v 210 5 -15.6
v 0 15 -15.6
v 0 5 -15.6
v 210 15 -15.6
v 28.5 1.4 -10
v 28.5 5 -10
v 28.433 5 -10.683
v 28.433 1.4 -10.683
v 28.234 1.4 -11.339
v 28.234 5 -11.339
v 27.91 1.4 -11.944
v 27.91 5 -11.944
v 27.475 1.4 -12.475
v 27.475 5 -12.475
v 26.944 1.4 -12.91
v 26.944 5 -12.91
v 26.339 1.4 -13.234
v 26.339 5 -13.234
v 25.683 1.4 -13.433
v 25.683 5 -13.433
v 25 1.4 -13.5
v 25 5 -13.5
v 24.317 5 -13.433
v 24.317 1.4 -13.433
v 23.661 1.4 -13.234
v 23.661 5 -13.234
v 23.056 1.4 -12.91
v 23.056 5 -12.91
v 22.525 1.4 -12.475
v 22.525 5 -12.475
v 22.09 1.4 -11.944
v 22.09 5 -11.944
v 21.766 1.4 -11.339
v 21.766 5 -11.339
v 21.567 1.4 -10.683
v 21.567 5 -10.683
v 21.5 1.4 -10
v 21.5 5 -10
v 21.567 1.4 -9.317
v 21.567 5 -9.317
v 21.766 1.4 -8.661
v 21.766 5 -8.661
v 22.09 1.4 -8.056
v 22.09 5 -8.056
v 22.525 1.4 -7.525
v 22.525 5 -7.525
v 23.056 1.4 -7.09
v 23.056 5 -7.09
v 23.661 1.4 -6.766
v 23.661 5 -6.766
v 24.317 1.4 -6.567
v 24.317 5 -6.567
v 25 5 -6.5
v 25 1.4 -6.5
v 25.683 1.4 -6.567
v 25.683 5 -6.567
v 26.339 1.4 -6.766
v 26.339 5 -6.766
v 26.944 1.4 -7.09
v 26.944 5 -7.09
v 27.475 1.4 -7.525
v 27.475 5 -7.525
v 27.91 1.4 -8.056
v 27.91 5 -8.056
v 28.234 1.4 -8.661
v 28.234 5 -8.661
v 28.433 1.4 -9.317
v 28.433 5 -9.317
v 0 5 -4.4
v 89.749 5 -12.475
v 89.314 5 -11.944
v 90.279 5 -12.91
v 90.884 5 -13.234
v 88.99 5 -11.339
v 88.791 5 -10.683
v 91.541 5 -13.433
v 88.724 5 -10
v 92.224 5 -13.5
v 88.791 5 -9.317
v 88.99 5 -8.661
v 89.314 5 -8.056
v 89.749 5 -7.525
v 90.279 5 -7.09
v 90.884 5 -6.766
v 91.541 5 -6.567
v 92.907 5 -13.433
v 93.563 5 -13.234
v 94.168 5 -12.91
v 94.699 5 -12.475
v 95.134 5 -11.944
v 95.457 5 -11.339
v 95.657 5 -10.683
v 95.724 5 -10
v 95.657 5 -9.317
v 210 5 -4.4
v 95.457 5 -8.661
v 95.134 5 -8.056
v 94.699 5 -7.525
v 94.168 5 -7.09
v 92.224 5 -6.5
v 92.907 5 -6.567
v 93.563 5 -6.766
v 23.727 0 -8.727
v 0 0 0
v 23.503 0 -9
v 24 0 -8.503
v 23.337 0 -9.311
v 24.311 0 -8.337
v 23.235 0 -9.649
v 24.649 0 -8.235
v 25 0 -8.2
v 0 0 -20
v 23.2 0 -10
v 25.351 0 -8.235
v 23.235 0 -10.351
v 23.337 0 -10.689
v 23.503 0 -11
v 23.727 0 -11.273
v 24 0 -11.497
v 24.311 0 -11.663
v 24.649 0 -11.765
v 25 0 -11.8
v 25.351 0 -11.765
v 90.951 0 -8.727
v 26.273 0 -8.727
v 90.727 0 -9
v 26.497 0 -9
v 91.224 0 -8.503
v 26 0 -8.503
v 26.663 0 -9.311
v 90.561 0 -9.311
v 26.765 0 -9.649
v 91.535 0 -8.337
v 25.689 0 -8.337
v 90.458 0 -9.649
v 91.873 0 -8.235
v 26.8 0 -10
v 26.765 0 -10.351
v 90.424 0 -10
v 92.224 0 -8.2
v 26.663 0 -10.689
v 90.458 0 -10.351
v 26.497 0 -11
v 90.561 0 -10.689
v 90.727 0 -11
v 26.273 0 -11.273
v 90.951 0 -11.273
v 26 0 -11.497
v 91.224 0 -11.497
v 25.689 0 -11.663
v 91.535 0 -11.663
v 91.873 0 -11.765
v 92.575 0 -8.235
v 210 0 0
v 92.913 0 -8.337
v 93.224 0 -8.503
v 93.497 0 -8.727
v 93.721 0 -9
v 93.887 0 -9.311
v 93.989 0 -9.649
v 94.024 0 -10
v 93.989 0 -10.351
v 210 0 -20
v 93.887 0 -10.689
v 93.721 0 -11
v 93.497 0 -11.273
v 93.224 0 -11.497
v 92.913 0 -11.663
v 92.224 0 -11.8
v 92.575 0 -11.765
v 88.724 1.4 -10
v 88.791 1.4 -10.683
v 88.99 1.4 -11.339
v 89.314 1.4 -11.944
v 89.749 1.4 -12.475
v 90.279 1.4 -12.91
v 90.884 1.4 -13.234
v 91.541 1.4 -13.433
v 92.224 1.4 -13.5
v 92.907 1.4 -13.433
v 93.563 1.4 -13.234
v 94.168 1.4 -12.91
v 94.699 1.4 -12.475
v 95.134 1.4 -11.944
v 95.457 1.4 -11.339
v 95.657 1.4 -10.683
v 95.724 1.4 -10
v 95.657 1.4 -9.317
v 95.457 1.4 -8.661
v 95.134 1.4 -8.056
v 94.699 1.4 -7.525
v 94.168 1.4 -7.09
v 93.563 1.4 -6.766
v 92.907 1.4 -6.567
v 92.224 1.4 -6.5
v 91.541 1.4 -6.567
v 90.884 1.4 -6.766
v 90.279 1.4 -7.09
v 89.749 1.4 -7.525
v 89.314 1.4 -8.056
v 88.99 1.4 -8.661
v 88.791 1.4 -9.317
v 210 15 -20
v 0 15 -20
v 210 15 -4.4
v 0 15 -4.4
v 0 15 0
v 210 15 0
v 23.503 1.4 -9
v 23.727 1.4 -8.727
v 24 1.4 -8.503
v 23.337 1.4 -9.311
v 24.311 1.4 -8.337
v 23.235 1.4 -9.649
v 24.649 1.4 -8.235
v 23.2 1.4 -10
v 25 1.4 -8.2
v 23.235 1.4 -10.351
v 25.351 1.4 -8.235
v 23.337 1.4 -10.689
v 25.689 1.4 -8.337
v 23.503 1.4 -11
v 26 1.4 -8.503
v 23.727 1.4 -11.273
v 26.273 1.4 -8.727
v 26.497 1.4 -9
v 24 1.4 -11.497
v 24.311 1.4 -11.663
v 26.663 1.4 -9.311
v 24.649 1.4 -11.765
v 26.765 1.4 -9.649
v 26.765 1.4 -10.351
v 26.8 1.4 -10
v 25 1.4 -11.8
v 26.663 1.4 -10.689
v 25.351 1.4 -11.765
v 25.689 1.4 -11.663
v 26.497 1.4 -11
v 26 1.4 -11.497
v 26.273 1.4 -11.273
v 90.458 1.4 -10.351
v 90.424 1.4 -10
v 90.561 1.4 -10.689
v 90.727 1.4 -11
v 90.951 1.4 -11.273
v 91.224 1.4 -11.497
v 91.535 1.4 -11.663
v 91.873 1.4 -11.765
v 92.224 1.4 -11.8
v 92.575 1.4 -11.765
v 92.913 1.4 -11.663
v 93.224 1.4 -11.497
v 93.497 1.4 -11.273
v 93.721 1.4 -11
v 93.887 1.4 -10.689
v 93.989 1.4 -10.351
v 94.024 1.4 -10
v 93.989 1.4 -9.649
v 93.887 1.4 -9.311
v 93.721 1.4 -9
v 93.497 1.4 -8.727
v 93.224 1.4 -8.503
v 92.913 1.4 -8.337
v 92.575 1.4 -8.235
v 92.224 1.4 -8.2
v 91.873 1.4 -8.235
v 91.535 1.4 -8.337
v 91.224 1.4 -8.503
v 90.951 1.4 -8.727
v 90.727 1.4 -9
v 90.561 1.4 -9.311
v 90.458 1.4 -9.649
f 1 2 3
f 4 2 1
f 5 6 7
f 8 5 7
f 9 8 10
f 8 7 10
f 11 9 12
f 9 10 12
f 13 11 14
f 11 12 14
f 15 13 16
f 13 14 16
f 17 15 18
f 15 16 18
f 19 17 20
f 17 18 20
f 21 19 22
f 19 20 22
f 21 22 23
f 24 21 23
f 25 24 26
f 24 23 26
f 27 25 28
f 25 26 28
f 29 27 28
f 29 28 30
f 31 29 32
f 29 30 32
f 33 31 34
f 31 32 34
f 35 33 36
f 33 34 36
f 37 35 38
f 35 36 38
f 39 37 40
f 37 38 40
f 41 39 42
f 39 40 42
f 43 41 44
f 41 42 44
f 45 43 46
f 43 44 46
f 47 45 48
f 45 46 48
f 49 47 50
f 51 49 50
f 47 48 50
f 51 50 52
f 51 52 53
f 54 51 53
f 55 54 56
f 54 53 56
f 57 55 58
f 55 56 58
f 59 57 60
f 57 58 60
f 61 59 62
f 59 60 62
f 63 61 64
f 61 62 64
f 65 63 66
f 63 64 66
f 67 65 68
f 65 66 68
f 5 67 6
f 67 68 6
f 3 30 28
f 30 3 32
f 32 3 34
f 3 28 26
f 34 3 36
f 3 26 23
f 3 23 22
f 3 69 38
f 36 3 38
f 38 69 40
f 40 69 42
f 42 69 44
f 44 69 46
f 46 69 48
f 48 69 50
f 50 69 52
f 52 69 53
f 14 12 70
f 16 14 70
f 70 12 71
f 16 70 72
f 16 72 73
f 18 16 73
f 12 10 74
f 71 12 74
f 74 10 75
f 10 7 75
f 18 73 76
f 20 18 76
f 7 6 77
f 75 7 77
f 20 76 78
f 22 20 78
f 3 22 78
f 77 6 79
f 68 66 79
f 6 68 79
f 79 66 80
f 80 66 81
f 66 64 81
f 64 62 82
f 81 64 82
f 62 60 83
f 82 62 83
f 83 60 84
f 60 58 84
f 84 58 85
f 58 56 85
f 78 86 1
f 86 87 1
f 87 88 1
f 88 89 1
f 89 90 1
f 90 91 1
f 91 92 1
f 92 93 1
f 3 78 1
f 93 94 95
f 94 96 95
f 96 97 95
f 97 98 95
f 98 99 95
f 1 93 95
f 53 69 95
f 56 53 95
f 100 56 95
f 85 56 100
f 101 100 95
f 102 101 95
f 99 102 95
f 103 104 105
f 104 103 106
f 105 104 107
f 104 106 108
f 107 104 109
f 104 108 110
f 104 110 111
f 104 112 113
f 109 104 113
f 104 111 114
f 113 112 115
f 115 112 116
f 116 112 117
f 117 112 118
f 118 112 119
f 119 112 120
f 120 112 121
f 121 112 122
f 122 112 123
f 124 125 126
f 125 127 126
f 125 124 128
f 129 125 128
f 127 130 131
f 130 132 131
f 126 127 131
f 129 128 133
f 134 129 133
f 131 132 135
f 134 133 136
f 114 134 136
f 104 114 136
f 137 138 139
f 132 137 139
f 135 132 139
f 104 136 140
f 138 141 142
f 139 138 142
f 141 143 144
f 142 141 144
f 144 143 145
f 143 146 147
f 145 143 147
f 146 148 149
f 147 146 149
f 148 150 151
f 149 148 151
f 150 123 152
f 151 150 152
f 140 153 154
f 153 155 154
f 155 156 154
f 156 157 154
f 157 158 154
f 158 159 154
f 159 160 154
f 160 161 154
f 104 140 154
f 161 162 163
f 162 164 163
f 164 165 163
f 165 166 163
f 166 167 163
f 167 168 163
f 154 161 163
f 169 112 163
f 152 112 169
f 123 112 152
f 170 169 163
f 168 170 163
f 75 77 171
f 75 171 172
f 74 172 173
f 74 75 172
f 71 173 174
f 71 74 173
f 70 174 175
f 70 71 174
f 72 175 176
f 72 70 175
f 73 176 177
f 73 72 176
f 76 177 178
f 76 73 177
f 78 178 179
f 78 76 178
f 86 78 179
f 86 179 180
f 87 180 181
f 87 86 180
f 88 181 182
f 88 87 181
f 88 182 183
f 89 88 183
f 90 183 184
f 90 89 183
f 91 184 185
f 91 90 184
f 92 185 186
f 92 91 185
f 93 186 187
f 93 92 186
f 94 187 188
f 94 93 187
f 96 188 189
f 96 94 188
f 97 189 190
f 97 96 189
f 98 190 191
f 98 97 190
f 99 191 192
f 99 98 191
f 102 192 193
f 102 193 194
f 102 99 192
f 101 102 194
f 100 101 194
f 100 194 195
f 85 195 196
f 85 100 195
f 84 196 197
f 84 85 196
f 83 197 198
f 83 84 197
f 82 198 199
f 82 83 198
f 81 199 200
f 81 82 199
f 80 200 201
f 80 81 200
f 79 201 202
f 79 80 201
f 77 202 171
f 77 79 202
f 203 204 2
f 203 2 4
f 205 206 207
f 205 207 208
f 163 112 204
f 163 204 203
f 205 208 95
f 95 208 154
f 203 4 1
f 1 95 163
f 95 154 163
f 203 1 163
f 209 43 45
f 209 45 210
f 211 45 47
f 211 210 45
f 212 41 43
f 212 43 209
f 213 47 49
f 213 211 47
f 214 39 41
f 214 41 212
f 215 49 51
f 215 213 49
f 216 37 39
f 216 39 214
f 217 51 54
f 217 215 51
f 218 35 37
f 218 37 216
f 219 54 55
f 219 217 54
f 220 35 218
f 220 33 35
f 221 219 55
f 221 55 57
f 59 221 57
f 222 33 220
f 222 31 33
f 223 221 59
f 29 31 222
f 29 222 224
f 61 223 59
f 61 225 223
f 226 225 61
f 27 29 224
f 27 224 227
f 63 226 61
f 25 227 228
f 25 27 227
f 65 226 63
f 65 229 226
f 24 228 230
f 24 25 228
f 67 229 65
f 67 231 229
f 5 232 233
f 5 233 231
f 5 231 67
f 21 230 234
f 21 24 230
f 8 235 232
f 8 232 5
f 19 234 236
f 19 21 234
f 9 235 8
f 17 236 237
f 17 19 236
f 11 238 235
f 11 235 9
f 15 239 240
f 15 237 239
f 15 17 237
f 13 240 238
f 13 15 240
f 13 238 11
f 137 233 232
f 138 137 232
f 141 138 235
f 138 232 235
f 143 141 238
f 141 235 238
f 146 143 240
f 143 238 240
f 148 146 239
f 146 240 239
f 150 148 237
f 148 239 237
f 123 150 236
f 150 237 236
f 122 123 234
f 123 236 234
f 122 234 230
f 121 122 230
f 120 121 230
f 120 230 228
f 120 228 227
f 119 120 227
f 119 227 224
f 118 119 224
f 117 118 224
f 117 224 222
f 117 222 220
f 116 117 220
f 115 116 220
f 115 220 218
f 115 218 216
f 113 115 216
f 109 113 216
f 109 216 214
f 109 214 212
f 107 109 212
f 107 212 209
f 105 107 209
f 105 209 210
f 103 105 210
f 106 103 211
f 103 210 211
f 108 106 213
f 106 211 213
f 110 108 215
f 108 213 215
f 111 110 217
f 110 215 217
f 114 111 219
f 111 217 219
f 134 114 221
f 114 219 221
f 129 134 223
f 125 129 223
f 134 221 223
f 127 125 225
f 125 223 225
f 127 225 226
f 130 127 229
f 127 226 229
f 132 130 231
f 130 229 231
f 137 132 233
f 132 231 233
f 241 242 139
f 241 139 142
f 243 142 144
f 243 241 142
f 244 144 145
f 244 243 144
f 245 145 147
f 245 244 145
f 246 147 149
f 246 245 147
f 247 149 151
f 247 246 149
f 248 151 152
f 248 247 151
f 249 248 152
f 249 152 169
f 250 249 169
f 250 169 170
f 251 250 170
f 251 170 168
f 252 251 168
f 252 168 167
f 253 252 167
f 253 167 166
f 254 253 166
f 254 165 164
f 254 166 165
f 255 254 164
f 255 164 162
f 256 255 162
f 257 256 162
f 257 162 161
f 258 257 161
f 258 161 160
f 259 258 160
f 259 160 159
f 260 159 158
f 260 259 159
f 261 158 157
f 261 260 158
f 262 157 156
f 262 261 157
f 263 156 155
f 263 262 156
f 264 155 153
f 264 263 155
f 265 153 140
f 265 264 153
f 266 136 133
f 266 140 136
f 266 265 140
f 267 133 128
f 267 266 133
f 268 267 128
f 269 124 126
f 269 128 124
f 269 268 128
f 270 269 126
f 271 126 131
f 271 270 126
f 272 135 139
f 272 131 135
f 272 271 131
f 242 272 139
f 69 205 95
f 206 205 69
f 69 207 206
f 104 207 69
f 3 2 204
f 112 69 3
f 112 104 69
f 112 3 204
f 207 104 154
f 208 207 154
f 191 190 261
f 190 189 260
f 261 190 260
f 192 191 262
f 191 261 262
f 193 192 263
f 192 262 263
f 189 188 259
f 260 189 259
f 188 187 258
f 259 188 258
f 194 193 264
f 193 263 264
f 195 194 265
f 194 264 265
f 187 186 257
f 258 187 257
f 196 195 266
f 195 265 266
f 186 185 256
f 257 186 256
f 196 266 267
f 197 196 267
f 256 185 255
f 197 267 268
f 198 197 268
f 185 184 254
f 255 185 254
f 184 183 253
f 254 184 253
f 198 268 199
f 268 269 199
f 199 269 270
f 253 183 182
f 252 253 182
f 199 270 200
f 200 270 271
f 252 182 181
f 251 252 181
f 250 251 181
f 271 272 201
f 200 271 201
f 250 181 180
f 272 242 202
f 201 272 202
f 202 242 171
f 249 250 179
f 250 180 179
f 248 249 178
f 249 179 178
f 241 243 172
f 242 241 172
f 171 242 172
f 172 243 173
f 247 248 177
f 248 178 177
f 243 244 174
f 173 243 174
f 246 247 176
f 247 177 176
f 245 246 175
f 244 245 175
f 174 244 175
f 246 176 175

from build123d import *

# Parameters (mm, degrees)
SKETCH1_W           = 210
SKETCH1_H           = 20
BOSS_EXTRUDE1_DEPTH = 15
SKETCH2_W           = 210
SKETCH2_H           = 10
CUT_EXTRUDE1_DEPTH  = 10
SKETCH3_R           = 1.8
CUT_EXTRUDE2_DEPTH  = 6
SKETCH5_R           = 3.5
CUT_EXTRUDE3_DEPTH  = 3.6
SKETCH6_W           = 210
SKETCH6_H           = 10
CUT_EXTRUDE4_DEPTH  = 0.6
SKETCH7_W           = 210
SKETCH7_H           = 10
CUT_EXTRUDE5_DEPTH  = 0.6


with BuildPart() as part:
    # Sketch1 → Boss-Extrude1 (new body)
    with BuildSketch(Plane(origin=(0, 0, 0), x_dir=(1, 0, 0), z_dir=(0, 1, 0))):
        with Locations((105, 10)):
            Rectangle(SKETCH1_W, SKETCH1_H)
    extrude(amount=BOSS_EXTRUDE1_DEPTH)

    # Sketch2 → Cut-Extrude1 (cut)
    with BuildSketch(Plane(origin=(0, 15, 0), x_dir=(1, 0, 0), z_dir=(0, 1, 0))):
        with Locations((105, 10)):
            Rectangle(SKETCH2_W, SKETCH2_H)
    extrude(amount=-CUT_EXTRUDE1_DEPTH, mode=Mode.SUBTRACT)

    # Sketch3 → Cut-Extrude2 (cut, through all)
    with BuildSketch(Plane(origin=(0, 5, 0), x_dir=(1, 0, 0), z_dir=(0, 1, 0))):
        with Locations((25, 10)):
            Circle(SKETCH3_R)
    cut_extrude2 = extrude(amount=-CUT_EXTRUDE2_DEPTH, mode=Mode.SUBTRACT)

    # Sketch5 → Cut-Extrude3 (cut)
    with BuildSketch(Plane(origin=(0, 5, 0), x_dir=(1, 0, 0), z_dir=(0, 1, 0))):
        with Locations((25, 10)):
            Circle(SKETCH5_R)
    cut_extrude3 = extrude(amount=-CUT_EXTRUDE3_DEPTH, mode=Mode.SUBTRACT)

    # Mirror2: Cut-Extrude2, Cut-Extrude3 across plane
    add(cut_extrude2.mirror(Plane(origin=(58.611943839, 0, 0), x_dir=(0, 0, 1), z_dir=(1, 0, 0))), mode=Mode.SUBTRACT)
    add(cut_extrude3.mirror(Plane(origin=(58.611943839, 0, 0), x_dir=(0, 0, 1), z_dir=(1, 0, 0))), mode=Mode.SUBTRACT)

    # Sketch6 → Cut-Extrude4 (cut)
    with BuildSketch(Plane.XY.offset(-15)):
        with Locations((105, 10)):
            Rectangle(SKETCH6_W, SKETCH6_H)
    extrude(amount=-CUT_EXTRUDE4_DEPTH, mode=Mode.SUBTRACT)

    # Sketch7 → Cut-Extrude5 (cut)
    with BuildSketch(Plane(origin=(0, 0, -5), x_dir=(-1, 0, 0), z_dir=(0, 0, -1))):
        with Locations((-105, 10)):
            Rectangle(SKETCH7_W, SKETCH7_H)
    extrude(amount=-CUT_EXTRUDE5_DEPTH, mode=Mode.SUBTRACT)


solid = part.part
